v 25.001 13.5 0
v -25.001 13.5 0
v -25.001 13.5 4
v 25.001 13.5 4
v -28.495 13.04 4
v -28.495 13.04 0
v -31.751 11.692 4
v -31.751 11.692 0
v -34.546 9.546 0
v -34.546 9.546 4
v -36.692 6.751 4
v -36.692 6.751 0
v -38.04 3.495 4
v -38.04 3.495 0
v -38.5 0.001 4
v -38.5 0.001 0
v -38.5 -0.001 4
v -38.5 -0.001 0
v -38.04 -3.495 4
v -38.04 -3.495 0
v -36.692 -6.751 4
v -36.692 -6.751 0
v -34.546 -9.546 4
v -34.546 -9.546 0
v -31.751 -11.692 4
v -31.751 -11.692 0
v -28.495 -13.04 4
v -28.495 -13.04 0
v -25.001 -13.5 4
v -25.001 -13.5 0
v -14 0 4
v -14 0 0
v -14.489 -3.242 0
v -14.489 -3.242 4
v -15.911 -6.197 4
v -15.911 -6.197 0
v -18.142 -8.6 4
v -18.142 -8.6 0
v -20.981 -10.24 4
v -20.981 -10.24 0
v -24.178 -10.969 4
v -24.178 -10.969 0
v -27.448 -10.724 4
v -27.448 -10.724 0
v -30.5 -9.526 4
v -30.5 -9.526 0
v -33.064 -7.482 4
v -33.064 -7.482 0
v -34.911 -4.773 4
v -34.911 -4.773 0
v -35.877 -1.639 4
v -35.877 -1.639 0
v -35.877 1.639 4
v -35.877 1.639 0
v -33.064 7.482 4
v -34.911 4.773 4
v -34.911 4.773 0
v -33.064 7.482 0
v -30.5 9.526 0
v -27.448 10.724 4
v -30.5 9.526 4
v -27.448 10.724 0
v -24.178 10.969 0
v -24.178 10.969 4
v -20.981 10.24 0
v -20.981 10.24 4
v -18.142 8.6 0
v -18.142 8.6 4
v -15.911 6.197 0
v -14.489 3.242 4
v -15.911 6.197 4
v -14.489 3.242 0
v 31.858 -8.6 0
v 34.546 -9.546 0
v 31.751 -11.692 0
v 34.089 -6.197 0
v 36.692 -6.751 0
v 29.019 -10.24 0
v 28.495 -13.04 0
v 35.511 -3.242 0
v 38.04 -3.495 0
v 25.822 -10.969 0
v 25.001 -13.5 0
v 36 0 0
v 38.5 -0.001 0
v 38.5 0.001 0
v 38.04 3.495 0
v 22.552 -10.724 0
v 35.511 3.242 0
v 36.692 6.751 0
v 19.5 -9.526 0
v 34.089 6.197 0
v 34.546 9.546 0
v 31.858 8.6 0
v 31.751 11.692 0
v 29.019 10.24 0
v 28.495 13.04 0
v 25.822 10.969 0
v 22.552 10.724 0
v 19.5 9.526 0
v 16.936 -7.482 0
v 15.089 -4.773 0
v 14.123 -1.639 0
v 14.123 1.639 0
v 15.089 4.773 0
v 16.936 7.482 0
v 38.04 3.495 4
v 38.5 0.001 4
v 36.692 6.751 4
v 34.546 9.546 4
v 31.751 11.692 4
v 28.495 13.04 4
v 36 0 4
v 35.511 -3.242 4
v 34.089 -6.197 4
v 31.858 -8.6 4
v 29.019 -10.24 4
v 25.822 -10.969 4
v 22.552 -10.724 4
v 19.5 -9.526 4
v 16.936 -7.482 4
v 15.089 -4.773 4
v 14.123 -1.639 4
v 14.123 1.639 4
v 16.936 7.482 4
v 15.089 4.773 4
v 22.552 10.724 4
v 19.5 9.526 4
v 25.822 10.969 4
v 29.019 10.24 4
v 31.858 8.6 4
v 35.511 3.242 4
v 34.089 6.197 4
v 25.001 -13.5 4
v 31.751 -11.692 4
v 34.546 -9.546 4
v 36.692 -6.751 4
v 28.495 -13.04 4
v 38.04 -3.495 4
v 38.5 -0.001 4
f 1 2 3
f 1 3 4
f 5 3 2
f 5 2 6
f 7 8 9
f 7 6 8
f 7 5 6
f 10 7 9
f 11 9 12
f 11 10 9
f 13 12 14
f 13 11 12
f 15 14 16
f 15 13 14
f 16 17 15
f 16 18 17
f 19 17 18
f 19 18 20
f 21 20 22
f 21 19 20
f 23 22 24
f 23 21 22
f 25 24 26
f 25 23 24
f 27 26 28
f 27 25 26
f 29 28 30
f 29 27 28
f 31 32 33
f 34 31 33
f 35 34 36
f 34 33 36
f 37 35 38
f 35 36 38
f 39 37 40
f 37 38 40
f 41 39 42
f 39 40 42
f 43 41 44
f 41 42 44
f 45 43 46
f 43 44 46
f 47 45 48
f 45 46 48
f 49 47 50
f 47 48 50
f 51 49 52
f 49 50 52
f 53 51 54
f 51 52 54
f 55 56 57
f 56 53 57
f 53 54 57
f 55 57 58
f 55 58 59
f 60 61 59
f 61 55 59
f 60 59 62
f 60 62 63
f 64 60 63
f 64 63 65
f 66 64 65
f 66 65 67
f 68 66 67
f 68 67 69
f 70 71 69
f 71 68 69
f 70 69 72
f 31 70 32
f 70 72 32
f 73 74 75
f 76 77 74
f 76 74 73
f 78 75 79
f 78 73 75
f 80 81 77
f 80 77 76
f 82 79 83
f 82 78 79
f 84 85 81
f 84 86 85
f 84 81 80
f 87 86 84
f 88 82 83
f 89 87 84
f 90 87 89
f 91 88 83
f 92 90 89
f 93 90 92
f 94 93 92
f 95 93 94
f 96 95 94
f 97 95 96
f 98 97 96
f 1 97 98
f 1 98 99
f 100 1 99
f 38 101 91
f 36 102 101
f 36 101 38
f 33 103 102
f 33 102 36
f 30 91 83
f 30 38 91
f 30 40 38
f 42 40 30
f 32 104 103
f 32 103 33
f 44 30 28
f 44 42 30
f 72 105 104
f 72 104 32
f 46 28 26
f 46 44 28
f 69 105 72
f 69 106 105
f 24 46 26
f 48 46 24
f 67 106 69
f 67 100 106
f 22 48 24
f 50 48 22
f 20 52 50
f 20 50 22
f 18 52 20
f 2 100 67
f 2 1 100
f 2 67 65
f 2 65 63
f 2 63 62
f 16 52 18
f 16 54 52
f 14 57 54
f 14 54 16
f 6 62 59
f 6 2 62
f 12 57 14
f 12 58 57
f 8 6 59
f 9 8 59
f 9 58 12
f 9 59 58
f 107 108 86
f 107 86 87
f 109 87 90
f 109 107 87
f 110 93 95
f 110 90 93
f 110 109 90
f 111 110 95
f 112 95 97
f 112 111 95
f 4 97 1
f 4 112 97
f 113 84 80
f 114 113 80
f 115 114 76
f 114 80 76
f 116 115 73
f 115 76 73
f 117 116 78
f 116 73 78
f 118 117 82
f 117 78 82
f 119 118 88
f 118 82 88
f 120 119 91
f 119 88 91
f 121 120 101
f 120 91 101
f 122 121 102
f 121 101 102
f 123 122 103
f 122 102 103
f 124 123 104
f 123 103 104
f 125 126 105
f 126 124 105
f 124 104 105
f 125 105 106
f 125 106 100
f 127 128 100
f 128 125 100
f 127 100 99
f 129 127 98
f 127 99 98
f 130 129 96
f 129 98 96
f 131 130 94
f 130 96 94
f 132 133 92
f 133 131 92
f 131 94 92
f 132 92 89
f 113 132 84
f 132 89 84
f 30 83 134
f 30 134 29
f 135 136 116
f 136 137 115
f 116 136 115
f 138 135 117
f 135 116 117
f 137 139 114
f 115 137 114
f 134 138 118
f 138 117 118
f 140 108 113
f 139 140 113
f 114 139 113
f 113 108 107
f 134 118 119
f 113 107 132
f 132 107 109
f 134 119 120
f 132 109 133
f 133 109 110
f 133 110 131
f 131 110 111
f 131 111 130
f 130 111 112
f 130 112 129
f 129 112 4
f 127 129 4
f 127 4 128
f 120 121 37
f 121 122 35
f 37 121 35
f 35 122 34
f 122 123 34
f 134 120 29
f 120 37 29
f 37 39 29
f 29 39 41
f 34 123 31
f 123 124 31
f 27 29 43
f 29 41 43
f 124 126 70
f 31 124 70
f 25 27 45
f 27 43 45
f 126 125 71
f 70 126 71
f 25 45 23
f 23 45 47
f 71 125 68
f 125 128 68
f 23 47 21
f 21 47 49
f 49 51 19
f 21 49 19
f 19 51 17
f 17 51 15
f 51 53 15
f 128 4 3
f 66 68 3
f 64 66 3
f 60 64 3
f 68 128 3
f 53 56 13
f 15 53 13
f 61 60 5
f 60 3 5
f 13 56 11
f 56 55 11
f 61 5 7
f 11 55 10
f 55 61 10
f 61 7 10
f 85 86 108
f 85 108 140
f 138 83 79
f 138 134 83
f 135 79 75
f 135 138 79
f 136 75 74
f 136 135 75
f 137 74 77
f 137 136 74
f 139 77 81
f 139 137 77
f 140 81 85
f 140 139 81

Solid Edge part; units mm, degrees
sketch "Sketch1" plane through (0, 0, 0) normal (0, 0, 1) x (1, 0, 0)
  circle A0 centre (-25, 0) radius 11
  line L0 (38.5, -13.5) -> (-38.5, -13.5)
  line L1 (-38.5, -13.5) -> (-38.5, 13.5)
  line L2 (-38.5, 13.5) -> (38.5, 13.5)
  line L3 (38.5, 13.5) -> (38.5, -13.5)
  circle A1 centre (25, 0) radius 11
  dimension "D1" = 77
  dimension "D2" = 27
  dimension "D3" = 22
  dimension "D4" = 50
  dimension "D5" = 25
extrude "Protrusion1" add sketch "Sketch1" along normal blind 4
fillet "Round_1" radius 13.5 4 edges at (-38.5, -13.5, 2) (-38.5, 13.5, 2) (38.5, 13.5, 2) (38.5, -13.5, 2)
